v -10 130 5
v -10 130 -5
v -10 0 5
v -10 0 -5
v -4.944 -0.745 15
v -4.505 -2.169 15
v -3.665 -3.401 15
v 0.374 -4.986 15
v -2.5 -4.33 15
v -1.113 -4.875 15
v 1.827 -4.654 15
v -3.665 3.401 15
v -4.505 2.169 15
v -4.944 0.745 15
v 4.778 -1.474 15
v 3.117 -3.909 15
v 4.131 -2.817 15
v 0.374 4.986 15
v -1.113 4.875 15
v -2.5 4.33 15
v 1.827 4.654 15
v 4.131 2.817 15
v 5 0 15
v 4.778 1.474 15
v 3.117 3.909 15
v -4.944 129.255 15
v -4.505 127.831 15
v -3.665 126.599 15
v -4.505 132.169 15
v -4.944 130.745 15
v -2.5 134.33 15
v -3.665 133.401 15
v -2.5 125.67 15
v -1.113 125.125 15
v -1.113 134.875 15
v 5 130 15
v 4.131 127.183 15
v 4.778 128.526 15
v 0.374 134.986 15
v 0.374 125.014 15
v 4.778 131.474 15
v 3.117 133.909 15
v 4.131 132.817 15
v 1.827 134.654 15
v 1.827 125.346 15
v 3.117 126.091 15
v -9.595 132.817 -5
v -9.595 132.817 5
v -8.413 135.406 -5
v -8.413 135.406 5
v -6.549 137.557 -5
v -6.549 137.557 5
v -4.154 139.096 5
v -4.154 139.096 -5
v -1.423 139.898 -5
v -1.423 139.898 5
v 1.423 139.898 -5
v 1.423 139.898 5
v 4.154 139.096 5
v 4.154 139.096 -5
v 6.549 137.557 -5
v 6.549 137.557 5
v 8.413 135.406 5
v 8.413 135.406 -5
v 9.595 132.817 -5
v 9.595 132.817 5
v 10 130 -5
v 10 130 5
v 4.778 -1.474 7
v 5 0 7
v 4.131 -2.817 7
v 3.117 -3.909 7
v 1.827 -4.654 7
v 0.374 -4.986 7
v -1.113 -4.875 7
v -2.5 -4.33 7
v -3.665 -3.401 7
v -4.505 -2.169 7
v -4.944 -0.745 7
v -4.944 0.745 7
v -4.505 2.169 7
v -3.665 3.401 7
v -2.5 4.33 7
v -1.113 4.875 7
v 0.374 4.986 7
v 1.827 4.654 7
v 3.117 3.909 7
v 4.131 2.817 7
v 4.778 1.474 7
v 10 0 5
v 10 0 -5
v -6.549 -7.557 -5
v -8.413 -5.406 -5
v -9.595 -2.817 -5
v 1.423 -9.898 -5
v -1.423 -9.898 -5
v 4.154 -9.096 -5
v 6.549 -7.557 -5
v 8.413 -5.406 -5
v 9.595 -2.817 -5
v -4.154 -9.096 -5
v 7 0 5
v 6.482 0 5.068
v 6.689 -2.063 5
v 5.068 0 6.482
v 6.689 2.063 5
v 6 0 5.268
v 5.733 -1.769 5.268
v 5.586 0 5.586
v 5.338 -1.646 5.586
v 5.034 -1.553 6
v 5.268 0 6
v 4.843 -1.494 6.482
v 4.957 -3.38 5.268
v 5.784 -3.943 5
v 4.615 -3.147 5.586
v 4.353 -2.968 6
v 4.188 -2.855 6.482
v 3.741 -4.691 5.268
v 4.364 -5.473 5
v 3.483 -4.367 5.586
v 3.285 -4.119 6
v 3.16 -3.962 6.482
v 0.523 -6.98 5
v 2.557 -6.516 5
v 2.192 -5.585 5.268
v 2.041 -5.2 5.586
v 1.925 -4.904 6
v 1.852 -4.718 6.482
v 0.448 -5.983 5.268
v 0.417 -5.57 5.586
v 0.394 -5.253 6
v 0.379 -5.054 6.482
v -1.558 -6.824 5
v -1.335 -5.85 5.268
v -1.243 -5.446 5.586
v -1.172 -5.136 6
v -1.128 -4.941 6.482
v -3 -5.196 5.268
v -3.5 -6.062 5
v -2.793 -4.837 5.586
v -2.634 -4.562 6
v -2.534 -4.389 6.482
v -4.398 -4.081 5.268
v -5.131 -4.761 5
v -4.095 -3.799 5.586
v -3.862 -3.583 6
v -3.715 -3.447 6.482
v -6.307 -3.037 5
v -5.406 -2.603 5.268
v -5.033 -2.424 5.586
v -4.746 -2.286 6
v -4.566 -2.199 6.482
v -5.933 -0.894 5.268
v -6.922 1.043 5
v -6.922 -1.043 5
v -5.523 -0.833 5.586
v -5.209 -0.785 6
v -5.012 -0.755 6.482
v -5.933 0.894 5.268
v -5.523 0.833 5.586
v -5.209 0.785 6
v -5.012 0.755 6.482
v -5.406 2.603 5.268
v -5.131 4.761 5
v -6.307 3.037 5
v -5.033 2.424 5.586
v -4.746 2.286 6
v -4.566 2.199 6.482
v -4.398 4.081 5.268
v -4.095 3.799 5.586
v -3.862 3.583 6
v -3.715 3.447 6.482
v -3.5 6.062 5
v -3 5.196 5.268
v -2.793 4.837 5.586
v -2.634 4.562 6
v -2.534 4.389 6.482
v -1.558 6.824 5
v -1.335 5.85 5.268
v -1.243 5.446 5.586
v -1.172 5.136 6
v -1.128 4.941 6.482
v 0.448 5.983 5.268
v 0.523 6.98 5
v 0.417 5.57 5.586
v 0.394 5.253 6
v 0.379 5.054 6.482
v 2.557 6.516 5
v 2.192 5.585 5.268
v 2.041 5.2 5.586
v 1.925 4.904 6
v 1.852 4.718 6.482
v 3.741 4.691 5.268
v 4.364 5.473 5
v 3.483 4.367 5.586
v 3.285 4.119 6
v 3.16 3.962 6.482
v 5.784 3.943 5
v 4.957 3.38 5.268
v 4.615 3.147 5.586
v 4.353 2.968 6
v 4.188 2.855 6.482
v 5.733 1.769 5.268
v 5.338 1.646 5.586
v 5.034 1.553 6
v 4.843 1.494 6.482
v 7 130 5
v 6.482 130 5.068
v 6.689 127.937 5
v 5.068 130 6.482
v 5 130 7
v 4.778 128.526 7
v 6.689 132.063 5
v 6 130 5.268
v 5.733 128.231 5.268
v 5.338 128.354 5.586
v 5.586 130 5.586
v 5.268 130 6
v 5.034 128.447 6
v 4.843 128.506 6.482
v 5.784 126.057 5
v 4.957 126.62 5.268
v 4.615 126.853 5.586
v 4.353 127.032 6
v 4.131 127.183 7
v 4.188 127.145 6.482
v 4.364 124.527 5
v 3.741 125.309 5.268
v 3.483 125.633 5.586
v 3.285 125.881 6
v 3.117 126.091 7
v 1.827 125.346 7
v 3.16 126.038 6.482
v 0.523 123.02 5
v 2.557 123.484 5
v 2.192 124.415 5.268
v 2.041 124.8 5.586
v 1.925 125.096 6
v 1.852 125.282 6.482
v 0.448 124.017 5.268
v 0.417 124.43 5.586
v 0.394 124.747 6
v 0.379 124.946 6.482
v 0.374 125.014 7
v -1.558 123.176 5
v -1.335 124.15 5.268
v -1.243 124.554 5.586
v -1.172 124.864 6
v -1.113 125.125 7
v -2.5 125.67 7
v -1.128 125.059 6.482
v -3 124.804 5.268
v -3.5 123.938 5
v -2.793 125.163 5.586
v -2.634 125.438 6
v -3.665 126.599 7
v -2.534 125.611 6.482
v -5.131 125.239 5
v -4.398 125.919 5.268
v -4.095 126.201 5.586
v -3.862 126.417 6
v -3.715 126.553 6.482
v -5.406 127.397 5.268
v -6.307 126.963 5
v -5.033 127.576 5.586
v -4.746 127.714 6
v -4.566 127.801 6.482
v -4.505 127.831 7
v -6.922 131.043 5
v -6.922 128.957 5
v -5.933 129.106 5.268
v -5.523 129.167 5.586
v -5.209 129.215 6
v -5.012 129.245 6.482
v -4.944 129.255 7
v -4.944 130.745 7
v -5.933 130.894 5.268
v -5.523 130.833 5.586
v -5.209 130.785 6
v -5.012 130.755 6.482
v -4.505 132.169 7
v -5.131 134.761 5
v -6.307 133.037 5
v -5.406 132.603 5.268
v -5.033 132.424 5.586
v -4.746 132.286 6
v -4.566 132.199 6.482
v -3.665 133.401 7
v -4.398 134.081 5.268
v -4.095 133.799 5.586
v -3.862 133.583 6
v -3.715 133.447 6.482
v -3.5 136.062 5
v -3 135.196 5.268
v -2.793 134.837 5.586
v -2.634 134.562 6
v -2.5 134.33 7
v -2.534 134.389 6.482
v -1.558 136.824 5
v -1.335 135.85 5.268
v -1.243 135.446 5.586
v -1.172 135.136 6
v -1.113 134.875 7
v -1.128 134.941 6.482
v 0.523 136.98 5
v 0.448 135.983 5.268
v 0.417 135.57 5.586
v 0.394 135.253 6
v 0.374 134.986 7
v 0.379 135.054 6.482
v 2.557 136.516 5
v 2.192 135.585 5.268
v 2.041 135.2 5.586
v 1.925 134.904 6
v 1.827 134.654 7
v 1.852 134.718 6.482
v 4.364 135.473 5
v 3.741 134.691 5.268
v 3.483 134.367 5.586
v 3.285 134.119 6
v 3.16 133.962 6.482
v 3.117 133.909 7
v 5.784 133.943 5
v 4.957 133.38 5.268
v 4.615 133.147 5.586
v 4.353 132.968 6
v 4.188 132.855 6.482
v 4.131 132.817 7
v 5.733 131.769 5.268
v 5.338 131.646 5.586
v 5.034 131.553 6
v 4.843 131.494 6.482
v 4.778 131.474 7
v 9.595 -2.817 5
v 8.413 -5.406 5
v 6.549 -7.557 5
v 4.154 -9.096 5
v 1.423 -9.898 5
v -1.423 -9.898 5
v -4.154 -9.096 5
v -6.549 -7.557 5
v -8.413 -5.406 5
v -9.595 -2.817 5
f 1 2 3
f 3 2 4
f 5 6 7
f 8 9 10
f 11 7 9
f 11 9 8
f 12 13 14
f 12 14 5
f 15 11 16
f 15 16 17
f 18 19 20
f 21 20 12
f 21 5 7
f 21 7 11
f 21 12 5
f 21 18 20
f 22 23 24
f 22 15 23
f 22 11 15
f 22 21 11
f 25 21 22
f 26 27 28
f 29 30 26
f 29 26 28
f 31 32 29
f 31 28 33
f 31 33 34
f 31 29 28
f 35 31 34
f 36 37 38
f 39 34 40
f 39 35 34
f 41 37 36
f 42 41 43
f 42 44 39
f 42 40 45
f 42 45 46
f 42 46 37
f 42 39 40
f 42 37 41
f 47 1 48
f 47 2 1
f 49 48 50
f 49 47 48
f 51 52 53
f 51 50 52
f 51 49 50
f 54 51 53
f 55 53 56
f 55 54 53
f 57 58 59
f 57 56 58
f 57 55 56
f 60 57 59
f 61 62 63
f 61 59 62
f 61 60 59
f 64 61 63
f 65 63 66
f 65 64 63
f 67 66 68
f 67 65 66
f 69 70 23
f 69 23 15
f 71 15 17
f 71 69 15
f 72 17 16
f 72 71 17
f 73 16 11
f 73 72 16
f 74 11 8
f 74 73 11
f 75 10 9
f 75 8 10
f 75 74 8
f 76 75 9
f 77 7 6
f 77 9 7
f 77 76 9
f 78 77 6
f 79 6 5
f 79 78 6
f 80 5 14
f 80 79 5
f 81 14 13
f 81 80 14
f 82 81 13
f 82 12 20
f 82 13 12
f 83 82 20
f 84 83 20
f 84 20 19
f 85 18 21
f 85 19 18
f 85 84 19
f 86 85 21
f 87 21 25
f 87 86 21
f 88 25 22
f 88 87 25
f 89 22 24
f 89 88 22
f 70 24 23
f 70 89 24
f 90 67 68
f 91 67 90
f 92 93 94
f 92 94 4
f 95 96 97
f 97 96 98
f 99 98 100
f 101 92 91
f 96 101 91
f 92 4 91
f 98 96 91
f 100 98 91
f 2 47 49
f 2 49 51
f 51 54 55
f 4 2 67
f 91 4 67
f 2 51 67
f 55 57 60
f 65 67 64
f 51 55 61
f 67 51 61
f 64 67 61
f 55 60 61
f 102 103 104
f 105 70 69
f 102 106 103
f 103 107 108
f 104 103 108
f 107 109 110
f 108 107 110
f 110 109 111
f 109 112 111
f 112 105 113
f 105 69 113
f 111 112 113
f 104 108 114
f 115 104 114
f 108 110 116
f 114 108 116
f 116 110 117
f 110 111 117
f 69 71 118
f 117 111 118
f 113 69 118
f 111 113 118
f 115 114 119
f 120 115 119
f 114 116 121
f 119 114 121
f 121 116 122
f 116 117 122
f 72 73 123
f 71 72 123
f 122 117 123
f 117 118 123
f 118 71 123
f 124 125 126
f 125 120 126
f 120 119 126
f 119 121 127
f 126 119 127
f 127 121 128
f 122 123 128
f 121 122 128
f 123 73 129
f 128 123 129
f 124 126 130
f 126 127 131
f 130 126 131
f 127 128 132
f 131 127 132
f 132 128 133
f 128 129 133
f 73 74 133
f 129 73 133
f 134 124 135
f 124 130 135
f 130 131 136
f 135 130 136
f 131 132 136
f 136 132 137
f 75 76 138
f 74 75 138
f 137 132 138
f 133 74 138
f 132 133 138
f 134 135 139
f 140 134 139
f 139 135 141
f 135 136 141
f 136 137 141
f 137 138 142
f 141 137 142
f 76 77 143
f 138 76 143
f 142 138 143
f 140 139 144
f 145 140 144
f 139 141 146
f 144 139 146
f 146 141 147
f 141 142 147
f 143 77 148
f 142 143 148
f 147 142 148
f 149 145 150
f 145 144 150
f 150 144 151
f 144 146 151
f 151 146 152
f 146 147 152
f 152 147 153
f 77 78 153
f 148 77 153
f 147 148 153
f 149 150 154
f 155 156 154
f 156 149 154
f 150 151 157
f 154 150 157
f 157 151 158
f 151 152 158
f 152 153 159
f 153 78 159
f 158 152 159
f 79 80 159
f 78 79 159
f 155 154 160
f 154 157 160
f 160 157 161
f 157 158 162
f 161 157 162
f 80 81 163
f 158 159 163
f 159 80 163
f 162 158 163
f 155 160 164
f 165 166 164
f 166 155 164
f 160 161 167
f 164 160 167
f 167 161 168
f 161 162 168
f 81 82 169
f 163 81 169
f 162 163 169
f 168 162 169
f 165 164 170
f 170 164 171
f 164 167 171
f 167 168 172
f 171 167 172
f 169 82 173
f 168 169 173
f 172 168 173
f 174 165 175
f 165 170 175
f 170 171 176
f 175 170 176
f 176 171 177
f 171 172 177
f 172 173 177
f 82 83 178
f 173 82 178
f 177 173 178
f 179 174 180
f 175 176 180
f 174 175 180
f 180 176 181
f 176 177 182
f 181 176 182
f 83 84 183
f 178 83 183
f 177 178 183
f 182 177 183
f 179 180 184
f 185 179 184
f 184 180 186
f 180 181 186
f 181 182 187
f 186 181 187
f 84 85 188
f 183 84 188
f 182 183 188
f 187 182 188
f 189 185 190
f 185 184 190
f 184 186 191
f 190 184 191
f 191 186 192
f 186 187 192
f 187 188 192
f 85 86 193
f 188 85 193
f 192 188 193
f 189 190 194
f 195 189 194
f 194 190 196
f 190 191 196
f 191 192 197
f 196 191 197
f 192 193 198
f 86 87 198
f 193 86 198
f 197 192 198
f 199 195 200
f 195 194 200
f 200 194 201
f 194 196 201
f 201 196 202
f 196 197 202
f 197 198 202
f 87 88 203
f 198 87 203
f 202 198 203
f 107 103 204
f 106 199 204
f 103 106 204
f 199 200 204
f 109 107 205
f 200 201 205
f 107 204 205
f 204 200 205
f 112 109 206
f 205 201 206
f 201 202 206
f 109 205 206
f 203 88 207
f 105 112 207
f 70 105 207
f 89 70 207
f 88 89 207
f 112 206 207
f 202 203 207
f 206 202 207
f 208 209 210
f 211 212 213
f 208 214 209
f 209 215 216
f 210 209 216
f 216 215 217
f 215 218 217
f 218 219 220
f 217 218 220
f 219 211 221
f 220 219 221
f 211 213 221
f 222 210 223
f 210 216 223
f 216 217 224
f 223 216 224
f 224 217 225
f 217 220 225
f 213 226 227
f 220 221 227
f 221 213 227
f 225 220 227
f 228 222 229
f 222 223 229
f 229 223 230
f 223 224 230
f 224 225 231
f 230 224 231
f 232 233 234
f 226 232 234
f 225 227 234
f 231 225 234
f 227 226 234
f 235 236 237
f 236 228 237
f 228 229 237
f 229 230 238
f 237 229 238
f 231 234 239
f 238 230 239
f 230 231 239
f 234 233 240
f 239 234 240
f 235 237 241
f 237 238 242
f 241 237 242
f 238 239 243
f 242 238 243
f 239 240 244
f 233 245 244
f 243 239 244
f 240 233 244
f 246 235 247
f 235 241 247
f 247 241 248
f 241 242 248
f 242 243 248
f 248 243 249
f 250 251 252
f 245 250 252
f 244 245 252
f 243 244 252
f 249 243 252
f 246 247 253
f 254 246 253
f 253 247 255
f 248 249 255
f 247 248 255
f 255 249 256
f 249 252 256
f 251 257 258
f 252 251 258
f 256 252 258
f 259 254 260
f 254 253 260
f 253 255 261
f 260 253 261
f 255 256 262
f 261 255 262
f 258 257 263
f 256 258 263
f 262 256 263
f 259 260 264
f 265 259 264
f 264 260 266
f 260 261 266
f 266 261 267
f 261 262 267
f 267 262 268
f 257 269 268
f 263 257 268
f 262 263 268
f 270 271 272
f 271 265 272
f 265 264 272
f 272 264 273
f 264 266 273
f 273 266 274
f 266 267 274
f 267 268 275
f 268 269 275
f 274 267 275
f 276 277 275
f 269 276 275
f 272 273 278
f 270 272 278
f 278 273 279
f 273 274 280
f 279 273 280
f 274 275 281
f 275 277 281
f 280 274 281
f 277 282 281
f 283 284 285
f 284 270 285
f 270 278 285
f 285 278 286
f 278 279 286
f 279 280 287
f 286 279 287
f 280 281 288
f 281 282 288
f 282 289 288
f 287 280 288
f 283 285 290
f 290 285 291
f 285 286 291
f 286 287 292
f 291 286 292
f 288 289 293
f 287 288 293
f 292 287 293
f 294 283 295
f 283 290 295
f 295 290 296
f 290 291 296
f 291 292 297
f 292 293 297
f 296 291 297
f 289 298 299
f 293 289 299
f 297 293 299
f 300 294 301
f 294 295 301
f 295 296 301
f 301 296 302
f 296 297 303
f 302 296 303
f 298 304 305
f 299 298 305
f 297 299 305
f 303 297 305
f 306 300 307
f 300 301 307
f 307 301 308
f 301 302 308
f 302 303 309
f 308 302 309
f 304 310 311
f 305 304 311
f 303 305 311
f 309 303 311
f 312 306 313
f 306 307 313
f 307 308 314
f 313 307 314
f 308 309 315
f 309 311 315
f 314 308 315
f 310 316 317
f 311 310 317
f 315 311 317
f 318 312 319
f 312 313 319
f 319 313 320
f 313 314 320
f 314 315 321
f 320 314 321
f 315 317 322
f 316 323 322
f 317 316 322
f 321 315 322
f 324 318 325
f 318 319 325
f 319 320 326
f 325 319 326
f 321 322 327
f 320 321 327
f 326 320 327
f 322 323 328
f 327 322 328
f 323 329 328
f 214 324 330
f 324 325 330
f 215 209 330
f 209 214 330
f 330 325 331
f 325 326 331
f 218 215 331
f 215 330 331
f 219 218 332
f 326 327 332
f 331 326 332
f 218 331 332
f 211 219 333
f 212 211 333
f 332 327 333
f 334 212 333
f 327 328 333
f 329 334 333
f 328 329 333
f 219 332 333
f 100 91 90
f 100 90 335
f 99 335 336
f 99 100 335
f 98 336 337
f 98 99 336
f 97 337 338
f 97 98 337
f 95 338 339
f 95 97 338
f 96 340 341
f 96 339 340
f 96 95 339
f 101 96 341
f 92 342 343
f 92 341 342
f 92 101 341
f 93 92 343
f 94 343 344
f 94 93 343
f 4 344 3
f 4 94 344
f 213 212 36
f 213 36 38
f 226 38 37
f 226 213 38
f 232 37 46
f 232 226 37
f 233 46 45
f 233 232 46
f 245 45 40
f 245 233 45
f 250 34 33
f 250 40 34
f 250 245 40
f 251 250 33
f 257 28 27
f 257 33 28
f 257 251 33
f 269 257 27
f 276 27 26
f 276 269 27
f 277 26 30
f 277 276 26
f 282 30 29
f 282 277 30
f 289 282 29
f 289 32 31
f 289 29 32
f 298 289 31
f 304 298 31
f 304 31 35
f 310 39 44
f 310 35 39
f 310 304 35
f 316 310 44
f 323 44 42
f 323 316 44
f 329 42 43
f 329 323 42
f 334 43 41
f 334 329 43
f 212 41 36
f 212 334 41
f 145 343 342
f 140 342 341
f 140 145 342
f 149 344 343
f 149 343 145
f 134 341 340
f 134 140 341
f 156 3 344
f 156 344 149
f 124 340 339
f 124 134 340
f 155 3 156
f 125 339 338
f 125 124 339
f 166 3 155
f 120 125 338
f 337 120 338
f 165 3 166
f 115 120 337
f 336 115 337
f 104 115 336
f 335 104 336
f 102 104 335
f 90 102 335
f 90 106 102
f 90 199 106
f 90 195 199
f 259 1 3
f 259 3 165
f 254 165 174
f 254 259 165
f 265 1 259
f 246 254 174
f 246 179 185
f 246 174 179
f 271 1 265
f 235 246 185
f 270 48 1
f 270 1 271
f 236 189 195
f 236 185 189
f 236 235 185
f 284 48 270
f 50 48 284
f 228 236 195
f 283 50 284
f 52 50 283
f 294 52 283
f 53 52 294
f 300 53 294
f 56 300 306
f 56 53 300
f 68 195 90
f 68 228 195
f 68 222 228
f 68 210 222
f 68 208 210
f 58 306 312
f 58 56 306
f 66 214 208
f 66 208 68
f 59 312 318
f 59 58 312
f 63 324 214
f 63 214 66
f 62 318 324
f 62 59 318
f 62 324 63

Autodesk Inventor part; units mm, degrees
ref_plane "YZ Plane" through (0, 0, 0) normal (1, 0, 0) x (0, 1, 0)
ref_plane "XZ Plane" through (0, 0, 0) normal (0, 1, 0) x (-1, 0, 0)
ref_plane "XY Plane" through (0, 0, 0) normal (0, 0, 1) x (1, 0, 0)
sketch "Sketch1" plane through (0, 0, 0) normal (0, 0, 1) x (1, 0, 0)
  circle A0 centre (0, 0) radius 5
  circle A1 centre (0, 130) radius 5
  circle A2 centre (0, 0) radius 10
  circle A3 centre (0, 130) radius 10
  line L0 (-10, 130) -> (-10, 0)
  line L1 (10, 130) -> (10, 0)
  dimension "d0" = 130
  dimension "d1" = 20
  dimension "d2" = 20
  dimension "d3" = 10
  dimension "d4" = 10
extrude "Extrusion1" add sketch "Sketch1" along normal mid plane 10 contours A0 | A1 | A2 | A2 L0 A3 L1 | A3
sketch "Sketch2" plane through (0, 0, 5) normal (0, 0, 1) x (1, 0, 0)
  arc A0 (10, 130) -> (-10, 130) centre (0, 130) ccw construction
  line L0 (-10, 130) -> (-10, 0) construction
  arc A1 (-10, 0) -> (10, 0) centre (0, 0) ccw construction
  line L1 (10, 0) -> (10, 130) construction
  circle A2 centre (0, 130) radius 5
  circle A3 centre (0, 0) radius 5
  dimension "d7" = 10
  dimension "d8" = 10
extrude "Extrusion2" add sketch "Sketch2" along normal blind 10
fillet "Fillet1" radius 2 2 edges at (-5, 130, 5) (-5, 0, 5)
properties part number "Eslabón 3" material "Steel"
